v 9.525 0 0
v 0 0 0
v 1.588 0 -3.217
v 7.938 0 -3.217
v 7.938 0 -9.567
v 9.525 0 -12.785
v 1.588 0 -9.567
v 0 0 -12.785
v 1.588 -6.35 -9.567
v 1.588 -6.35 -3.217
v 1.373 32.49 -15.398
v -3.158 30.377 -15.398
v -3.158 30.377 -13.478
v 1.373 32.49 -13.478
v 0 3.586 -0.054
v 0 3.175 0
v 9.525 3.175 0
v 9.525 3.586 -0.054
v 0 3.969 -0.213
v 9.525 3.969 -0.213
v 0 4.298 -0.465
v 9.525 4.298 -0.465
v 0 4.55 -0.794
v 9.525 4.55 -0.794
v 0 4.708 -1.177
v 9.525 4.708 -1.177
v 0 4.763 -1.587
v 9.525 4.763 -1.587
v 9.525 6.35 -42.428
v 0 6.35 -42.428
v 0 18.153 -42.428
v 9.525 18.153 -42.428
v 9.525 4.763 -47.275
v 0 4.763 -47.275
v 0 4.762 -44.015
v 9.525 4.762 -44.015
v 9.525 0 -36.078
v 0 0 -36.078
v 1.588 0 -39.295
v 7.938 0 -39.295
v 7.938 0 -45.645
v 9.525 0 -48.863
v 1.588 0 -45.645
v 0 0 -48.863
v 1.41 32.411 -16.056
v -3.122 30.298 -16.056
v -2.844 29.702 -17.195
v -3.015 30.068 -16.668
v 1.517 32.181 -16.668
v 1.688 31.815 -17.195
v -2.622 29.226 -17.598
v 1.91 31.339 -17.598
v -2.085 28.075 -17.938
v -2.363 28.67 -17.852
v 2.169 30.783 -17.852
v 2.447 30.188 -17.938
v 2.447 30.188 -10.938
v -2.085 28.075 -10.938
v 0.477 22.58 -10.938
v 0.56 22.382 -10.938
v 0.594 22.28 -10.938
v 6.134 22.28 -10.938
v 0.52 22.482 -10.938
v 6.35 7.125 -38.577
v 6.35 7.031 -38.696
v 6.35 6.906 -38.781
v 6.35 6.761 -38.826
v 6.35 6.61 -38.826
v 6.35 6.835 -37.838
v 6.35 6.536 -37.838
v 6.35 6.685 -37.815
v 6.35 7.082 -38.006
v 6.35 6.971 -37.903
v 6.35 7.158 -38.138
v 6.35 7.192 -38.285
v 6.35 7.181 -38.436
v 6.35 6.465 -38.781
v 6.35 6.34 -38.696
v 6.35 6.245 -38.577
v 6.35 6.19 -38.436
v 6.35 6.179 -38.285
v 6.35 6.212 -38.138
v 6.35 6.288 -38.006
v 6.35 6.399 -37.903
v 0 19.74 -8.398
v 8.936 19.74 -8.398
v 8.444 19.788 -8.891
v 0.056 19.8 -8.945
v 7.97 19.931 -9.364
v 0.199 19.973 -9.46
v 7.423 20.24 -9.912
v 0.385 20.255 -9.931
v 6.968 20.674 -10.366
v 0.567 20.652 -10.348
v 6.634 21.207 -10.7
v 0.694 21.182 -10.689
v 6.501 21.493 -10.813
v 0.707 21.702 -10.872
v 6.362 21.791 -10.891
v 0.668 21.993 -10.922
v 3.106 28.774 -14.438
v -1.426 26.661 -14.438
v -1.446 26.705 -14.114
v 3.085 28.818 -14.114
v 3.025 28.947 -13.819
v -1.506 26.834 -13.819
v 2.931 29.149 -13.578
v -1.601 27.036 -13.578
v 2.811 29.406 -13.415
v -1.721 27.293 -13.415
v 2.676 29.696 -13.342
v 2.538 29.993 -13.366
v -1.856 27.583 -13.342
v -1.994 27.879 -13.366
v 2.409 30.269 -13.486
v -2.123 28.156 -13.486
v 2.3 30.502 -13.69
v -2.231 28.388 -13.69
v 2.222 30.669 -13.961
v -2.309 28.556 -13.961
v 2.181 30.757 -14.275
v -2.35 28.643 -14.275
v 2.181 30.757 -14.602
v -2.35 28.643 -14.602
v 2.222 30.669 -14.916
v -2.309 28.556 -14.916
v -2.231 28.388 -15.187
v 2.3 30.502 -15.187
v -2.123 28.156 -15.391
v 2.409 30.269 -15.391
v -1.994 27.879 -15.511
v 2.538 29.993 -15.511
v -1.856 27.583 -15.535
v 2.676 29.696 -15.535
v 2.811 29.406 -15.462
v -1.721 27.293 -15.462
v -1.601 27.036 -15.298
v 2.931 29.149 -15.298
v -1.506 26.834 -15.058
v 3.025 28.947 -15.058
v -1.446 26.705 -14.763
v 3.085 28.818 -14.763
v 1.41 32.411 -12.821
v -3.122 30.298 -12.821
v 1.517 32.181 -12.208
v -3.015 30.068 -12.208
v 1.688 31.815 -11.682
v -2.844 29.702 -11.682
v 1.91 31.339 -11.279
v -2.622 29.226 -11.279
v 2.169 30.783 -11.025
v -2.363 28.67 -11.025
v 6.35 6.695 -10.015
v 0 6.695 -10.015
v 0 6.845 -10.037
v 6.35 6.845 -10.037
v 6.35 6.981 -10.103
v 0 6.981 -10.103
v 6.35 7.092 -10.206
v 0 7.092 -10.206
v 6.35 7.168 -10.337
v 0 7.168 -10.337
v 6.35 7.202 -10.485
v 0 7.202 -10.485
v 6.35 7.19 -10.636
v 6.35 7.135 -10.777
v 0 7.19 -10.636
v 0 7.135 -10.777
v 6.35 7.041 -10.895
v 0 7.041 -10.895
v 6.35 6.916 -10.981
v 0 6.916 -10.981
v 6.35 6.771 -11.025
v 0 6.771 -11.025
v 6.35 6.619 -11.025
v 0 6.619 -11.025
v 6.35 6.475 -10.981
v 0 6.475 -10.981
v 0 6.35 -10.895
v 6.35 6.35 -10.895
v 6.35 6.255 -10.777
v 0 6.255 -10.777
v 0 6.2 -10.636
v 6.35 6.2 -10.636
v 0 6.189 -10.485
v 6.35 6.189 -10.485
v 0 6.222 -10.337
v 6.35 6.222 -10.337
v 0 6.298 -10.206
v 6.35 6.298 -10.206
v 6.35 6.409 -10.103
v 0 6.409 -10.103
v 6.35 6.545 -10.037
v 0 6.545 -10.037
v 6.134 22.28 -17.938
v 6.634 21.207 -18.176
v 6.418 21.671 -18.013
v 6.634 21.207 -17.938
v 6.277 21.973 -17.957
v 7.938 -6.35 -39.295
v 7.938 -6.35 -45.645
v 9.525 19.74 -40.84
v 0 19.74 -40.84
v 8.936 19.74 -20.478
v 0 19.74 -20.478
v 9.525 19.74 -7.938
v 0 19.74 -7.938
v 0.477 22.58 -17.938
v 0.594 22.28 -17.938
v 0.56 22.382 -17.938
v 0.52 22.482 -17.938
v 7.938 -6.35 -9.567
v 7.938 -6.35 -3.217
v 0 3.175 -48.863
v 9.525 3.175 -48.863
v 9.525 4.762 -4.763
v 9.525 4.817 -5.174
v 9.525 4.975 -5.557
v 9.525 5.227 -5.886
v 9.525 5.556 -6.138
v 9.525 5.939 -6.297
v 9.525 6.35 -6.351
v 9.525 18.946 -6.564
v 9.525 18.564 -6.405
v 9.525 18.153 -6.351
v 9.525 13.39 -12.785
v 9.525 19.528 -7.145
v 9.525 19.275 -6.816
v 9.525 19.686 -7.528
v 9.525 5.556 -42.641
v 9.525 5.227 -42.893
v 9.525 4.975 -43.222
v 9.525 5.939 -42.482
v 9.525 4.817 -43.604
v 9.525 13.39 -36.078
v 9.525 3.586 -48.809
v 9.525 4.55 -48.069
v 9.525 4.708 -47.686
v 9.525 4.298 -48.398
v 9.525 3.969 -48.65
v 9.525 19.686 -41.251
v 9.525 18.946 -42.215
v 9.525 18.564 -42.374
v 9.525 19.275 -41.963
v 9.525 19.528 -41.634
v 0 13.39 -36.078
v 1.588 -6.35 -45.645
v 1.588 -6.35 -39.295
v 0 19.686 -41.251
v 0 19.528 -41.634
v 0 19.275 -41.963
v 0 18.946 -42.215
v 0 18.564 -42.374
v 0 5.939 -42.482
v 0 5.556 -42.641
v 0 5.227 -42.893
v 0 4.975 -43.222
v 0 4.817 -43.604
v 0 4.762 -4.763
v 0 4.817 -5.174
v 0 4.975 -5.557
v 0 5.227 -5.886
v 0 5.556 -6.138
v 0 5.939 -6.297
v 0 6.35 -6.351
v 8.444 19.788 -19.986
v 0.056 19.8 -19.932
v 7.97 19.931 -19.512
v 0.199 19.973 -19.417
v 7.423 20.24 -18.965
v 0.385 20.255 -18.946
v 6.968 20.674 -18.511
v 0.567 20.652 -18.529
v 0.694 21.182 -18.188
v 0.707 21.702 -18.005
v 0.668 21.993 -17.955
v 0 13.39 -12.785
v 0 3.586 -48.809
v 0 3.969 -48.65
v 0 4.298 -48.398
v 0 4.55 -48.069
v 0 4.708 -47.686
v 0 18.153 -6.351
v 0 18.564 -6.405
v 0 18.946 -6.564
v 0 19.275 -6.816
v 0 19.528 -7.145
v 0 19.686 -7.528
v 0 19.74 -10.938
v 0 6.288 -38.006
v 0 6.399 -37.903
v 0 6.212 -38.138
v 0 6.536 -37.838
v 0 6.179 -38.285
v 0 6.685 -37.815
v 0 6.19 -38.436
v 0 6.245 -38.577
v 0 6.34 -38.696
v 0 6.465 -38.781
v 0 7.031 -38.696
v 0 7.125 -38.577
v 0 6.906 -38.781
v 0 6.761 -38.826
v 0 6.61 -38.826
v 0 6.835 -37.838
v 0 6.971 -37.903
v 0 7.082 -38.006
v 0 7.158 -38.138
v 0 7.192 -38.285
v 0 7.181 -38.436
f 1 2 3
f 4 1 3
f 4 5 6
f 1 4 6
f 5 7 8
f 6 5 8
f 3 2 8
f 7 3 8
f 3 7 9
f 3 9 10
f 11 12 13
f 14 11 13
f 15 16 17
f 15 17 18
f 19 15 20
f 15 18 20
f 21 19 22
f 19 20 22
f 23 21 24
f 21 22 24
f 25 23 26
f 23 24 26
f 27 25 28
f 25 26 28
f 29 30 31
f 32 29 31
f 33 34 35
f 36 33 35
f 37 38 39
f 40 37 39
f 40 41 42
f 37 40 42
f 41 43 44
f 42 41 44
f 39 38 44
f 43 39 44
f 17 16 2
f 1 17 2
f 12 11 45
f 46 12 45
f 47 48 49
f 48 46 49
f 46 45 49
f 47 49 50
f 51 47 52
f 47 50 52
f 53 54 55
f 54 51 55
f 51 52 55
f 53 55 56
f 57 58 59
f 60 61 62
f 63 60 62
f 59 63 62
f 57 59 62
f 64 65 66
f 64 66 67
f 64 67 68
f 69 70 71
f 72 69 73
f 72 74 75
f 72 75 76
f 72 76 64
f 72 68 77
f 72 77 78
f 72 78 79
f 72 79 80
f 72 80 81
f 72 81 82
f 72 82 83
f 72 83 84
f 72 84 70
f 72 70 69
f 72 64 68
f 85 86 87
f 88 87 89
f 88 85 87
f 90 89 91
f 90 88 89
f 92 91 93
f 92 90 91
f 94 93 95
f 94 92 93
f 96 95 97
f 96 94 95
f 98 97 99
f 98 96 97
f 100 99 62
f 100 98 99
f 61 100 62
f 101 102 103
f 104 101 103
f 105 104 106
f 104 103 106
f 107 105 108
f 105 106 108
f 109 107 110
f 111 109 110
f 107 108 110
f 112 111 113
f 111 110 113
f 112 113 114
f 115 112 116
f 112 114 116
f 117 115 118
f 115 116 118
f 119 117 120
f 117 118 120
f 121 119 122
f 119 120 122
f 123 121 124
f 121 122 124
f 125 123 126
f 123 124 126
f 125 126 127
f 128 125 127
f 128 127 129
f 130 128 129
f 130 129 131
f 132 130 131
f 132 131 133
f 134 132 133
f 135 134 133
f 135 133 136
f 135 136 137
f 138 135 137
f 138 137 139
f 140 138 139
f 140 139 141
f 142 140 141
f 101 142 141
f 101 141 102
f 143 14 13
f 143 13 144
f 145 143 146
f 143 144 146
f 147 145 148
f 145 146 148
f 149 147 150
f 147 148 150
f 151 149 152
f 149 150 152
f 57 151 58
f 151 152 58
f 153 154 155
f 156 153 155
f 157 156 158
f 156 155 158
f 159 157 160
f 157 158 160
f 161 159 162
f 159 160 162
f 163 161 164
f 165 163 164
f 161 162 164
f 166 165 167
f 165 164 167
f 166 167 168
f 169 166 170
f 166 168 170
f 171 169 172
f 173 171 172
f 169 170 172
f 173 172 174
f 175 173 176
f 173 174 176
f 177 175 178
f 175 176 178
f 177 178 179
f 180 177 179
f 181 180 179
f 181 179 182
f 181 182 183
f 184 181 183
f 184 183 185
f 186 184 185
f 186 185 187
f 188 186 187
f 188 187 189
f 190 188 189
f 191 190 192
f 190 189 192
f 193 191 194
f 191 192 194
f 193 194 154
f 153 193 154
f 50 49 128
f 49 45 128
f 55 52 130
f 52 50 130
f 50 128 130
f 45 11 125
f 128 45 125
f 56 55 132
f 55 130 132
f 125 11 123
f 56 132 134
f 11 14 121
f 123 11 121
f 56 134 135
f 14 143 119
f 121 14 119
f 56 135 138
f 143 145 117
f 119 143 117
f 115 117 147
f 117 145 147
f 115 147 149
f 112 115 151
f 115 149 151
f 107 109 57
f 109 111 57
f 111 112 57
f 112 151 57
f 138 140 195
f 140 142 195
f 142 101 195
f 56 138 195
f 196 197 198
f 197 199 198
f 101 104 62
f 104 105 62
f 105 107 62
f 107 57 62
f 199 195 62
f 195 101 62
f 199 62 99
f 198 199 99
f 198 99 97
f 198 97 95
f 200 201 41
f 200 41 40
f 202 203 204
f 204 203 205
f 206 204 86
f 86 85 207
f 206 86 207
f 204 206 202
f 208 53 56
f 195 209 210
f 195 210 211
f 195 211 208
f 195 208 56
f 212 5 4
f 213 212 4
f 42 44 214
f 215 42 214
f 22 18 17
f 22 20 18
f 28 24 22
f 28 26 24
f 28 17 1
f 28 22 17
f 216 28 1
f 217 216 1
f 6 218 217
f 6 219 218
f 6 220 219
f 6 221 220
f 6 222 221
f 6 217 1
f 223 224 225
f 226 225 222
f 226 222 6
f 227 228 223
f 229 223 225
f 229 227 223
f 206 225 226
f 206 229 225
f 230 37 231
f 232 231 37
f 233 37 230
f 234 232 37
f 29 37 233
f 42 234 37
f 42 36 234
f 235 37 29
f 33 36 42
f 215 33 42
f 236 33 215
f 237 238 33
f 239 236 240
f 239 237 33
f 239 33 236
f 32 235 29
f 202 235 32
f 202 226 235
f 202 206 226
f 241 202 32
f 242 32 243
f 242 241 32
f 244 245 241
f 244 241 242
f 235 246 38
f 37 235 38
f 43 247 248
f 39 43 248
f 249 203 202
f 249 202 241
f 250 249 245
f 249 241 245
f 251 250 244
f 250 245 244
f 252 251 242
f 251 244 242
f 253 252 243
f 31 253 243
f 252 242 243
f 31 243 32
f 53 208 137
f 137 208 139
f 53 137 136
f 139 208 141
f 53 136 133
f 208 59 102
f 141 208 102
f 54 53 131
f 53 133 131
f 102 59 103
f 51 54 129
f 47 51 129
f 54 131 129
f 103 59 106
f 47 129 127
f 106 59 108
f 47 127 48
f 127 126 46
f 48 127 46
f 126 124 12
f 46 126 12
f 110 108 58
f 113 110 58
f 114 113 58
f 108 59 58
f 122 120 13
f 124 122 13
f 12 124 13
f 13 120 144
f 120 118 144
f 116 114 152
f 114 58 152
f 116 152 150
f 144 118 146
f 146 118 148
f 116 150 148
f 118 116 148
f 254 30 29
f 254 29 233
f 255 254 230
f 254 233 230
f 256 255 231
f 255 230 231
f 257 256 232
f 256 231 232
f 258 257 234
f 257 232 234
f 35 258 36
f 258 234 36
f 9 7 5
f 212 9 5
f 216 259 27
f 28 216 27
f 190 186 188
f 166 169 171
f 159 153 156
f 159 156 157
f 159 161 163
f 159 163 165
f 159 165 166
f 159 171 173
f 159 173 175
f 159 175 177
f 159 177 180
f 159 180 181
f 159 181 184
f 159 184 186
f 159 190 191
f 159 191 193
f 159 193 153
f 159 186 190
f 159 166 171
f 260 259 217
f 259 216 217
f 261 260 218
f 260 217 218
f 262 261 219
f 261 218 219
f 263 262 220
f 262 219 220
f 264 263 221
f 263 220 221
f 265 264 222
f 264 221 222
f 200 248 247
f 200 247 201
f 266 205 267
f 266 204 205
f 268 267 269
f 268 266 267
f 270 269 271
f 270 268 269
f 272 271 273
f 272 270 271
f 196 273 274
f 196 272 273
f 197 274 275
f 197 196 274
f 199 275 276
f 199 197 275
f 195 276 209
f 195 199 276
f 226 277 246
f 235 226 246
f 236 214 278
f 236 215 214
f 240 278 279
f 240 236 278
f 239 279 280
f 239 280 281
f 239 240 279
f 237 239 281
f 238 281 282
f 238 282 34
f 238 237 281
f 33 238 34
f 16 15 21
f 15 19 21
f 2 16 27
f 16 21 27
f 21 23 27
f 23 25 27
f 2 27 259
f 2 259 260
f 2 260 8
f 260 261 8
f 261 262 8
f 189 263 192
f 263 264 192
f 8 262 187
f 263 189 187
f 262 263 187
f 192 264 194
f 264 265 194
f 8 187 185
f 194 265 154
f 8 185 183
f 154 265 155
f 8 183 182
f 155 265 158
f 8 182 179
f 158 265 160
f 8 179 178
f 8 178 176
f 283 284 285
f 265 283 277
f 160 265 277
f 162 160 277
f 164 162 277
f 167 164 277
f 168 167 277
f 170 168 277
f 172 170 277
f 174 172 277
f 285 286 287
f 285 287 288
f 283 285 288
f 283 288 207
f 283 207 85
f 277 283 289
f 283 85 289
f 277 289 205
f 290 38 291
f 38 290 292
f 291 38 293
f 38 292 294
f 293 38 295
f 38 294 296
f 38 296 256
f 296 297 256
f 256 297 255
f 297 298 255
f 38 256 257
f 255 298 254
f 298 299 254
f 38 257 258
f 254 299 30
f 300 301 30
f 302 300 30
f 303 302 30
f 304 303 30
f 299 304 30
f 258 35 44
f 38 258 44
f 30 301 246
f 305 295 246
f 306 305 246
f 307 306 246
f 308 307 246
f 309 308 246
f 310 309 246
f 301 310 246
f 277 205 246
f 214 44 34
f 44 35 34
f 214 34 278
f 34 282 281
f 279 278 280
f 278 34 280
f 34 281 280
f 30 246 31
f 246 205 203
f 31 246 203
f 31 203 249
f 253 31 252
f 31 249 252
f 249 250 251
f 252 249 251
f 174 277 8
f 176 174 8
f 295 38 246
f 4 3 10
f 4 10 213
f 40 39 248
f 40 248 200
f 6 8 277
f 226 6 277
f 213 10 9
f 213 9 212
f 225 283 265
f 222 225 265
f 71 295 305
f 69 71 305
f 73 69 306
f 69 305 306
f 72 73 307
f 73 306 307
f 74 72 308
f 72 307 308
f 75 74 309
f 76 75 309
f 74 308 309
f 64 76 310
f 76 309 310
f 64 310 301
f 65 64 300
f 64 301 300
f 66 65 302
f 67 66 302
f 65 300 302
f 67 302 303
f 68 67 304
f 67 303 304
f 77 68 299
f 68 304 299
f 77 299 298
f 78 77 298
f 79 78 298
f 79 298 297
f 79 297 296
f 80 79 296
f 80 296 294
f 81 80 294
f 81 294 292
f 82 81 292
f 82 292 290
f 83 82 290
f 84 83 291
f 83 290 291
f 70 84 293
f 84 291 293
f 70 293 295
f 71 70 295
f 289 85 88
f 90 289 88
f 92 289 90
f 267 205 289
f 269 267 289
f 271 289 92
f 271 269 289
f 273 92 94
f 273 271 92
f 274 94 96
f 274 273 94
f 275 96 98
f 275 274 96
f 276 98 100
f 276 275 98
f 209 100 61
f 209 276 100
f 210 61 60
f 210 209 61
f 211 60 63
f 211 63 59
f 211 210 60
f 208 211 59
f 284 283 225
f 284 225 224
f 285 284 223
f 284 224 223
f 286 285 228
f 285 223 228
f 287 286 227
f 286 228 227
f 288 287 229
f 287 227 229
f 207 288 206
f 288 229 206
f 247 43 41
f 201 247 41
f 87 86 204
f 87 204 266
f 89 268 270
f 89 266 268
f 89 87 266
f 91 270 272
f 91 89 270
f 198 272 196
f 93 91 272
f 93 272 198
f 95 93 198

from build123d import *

# Parameters (mm, degrees)
BOSS_EXTRUDE1_DEPTH     = 9.525
SKETCH3_R               = 0.508
CUT_EXTRUDE2_DEPTH      = 6.35
FILLET1_R               = 1.5875
ESQUISSE1_W             = 6.35
ESQUISSE1_H             = 6.35
BOSS_EXTRU_1_DEPTH      = 6.35
ESQUISSE2_W             = 7
ESQUISSE2_H             = 5
BOSS_EXTRU_2_DEPTH      = 15
ESQUISSE3_R             = 1.1
ENL_V_MAT_EXTRU_1_DEPTH = 58.756287679
CONG_1_R                = 2.54


with BuildPart() as part:
    # Sketch1 → Boss-Extrude1 (new body)
    with BuildSketch(Plane(origin=(0, 0, 0), x_dir=(0, 0, -1), z_dir=(1, 0, 0))):
        Polygon((0, 0), (12.7847852, 0), (12.7847852, 13.390245), (36.0778552, 13.390245), (36.0778552, 0), (48.8626404, 0), (48.8626404, 4.7625), (42.4278552, 4.7625), (42.4278552, 19.740245), (41.4309052, 19.740245), (6.3509652, 19.740245), (6.3509652, 4.7625), (0, 4.7625), align=None)
    extrude(amount=BOSS_EXTRUDE1_DEPTH)

    # Sketch3 → Cut-Extrude2 (cut)
    with BuildSketch(Plane.ZY):
        with Locations((-38.3232152, 6.68528)):
            Circle(SKETCH3_R)
        with Locations((-10.5229152, 6.6951225)):
            Circle(SKETCH3_R)
    extrude(amount=-CUT_EXTRUDE2_DEPTH, mode=Mode.SUBTRACT)

    # Fillet1
    fillet1_edges = [part.edges().sort_by_distance(p)[0] for p in [
        (4.7625, 4.7625, 0),
        (4.7625, 4.7625, -6.3509652),
        (4.7625, 19.740245, -6.3509652),
        (4.7625, 19.740245, -42.4278552),
        (4.7625, 4.7625, -42.4278552),
        (4.7625, 4.7625, -48.8626404),
    ]]
    fillet(fillet1_edges, radius=FILLET1_R)

    # Esquisse1 → Boss.-Extru.1 (add)
    with BuildSketch(Plane.XZ):
        with Locations((4.7625, -42.4702478)):
            Rectangle(ESQUISSE1_W, ESQUISSE1_H)
        with Locations((4.7625, -6.3923926)):
            Rectangle(ESQUISSE1_W, ESQUISSE1_H)
    extrude(amount=BOSS_EXTRU_1_DEPTH)

    # Esquisse2 → Boss.-Extru.2 (add)
    with BuildSketch(Plane(origin=(-5.859728485, 12.566228289, 0), x_dir=(0, 0, 1), z_dir=(0.4226182617389464, -0.9063077870374674, 0))):
        with Locations((-14.4384652, -12.4751697)):
            Rectangle(ESQUISSE2_W, ESQUISSE2_H)
    extrude(amount=-BOSS_EXTRU_2_DEPTH)

    # Esquisse3 → Enlèv. mat.-Extru.1 (cut, through all)
    with BuildSketch(Plane(origin=(9.040573976, 4.215688879, 0), x_dir=(0, 0, 1), z_dir=(-0.9063077870367755, -0.4226182617404302, 0))):
        with Locations(Location((-14.4384652, 25.865298818, 0), (0, 0, 270))):
            Circle(ESQUISSE3_R)
    extrude(amount=-ENL_V_MAT_EXTRU_1_DEPTH, mode=Mode.SUBTRACT)

    # Congé1
    # the kernel refuses this fillet: 2.54 mm, written as the material it adds along each edge
    with BuildSketch(Plane(origin=(7.318244162, 19.740245, -10.9384652), x_dir=(1, 0, 0), z_dir=(0, 0, -1))) as cong_1_piece_1:
        with BuildLine():
            CenterArc((CONG_1_R * 0.637070260809, -CONG_1_R), CONG_1_R, 90, 65)
            Line((-CONG_1_R * 0.269237526229, -CONG_1_R * 0.577381738261), (0, 0))
            Line((0, 0), (CONG_1_R * 0.637070260809, 0))
        make_face()
    extrude(amount=7)
    with BuildSketch(Plane(origin=(-4.548645433, 19.740245, -10.9384652), x_dir=(0, 0, 1), z_dir=(1, 0, 0))) as cong_1_piece_2_section:
        with BuildLine():
            CenterArc((CONG_1_R, -CONG_1_R), CONG_1_R, 90, 90)
            Line((0, -CONG_1_R), (0, 0))
            Line((0, 0), (CONG_1_R, 0))
        make_face()
    cong_1_piece_2 = extrude(amount=18.216889595, mode=Mode.PRIVATE)
    cong_1_piece_2 = split(cong_1_piece_2, bisect_by=Plane(origin=(5.198744163, 24.285527416, -10.9384652), z_dir=(-0.9063077870374674, -0.4226182617389464, 0)), keep=Keep.TOP, mode=Mode.PRIVATE)
    cong_1_piece_2 = split(cong_1_piece_2, bisect_by=Plane(origin=(0.667205228, 22.172436107, -10.9384652), z_dir=(0.9063077870374674, 0.4226182617389464, 0)), keep=Keep.TOP, mode=Mode.PRIVATE)
    add(cong_1_piece_2)
    with BuildSketch(Plane(origin=(1.801354567, 19.740245, -17.9384652), x_dir=(-1, 0, 0), z_dir=(0, 0, 1))) as cong_1_piece_3:
        with BuildLine():
            CenterArc((3.626366432, -1.766615888), CONG_1_R, 135.931485235, 69.068514765)
            Line((1.324344653, -2.840066273), (0, 0))
            Line((0, 0), (1.801354567, 0))
        make_face()
    extrude(amount=7)
    with BuildSketch(Plane(origin=(13.668244162, 19.740245, -17.9384652), x_dir=(0, 0, -1), z_dir=(-1, 0, 0))) as cong_1_piece_4_section:
        with BuildLine():
            CenterArc((CONG_1_R, -CONG_1_R), CONG_1_R, 90, 90)
            Line((0, -CONG_1_R), (0, 0))
            Line((0, 0), (CONG_1_R, 0))
        make_face()
    cong_1_piece_4 = extrude(amount=18.216889595, mode=Mode.PRIVATE)
    cong_1_piece_4 = split(cong_1_piece_4, bisect_by=Plane(origin=(8.452393501, 17.308053893, -17.9384652), z_dir=(-0.9063077870374674, -0.4226182617389464, 0)), keep=Keep.TOP, mode=Mode.PRIVATE)
    cong_1_piece_4 = split(cong_1_piece_4, bisect_by=Plane(origin=(3.920854566, 15.194962584, -17.9384652), z_dir=(0.9063077870374674, 0.4226182617389464, 0)), keep=Keep.TOP, mode=Mode.PRIVATE)
    add(cong_1_piece_4)
    with BuildSketch(Plane(origin=(7.318244162, 19.740245, -6.893069044), x_dir=(1, 0, 0), z_dir=(0, 0, -1))) as cong_1_piece_5a_section:
        with BuildLine():
            CenterArc((CONG_1_R * 0.637070260809, -CONG_1_R), CONG_1_R, 90, 65)
            Line((-CONG_1_R * 0.269237526229, -CONG_1_R * 0.577381738261), (0, 0))
            Line((0, 0), (CONG_1_R * 0.637070260809, 0))
        make_face()
    cong_1_piece_5a = extrude(amount=11.045396156, mode=Mode.PRIVATE)
    cong_1_piece_5a = split(cong_1_piece_5a, bisect_by=Plane(origin=(7.318244162, 19.740245, -10.9384652), z_dir=(0, 0, 1)), keep=Keep.TOP, mode=Mode.PRIVATE)
    with BuildSketch(Plane(origin=(-4.548645433, 19.740245, -10.9384652), x_dir=(0, 0, 1), z_dir=(1, 0, 0))) as cong_1_piece_5b_section:
        with BuildLine():
            CenterArc((CONG_1_R, -CONG_1_R), CONG_1_R, 90, 90)
            Line((0, -CONG_1_R), (0, 0))
            Line((0, 0), (CONG_1_R, 0))
        make_face()
    cong_1_piece_5b = extrude(amount=18.216889595, mode=Mode.PRIVATE)
    cong_1_piece_5b = split(cong_1_piece_5b, bisect_by=Plane(origin=(9.525, 19.740245, -10.9384652), z_dir=(-1, 0, 0)), keep=Keep.TOP, mode=Mode.PRIVATE)
    cong_1_piece_5b = split(cong_1_piece_5b, bisect_by=Plane(origin=(5.198744163, 24.285527416, -10.9384652), z_dir=(0.9063077870374674, 0.4226182617389464, 0)), keep=Keep.TOP, mode=Mode.PRIVATE)
    cong_1_piece_5 = cong_1_piece_5a & cong_1_piece_5b
    add(cong_1_piece_5)
    with BuildSketch(Plane(origin=(13.668244162, 19.740245, -17.9384652), x_dir=(0, 0, -1), z_dir=(-1, 0, 0))) as cong_1_piece_6a_section:
        with BuildLine():
            CenterArc((CONG_1_R, -CONG_1_R), CONG_1_R, 90, 90)
            Line((0, -CONG_1_R), (0, 0))
            Line((0, 0), (CONG_1_R, 0))
        make_face()
    cong_1_piece_6a = extrude(amount=18.216889595, mode=Mode.PRIVATE)
    cong_1_piece_6a = split(cong_1_piece_6a, bisect_by=Plane(origin=(9.525, 19.740245, -17.9384652), z_dir=(-1, 0, 0)), keep=Keep.TOP, mode=Mode.PRIVATE)
    cong_1_piece_6a = split(cong_1_piece_6a, bisect_by=Plane(origin=(8.452393501, 17.308053893, -17.9384652), z_dir=(0.9063077870374674, 0.4226182617389464, 0)), keep=Keep.TOP, mode=Mode.PRIVATE)
    with BuildSketch(Plane(origin=(7.318244162, 19.740245, -10.9384652), x_dir=(1, 0, 0), z_dir=(0, 0, -1))) as cong_1_piece_6b_section:
        with BuildLine():
            CenterArc((CONG_1_R * 0.637070260809, -CONG_1_R), CONG_1_R, 90, 65)
            Line((-CONG_1_R * 0.269237526229, -CONG_1_R * 0.577381738261), (0, 0))
            Line((0, 0), (CONG_1_R * 0.637070260809, 0))
        make_face()
    cong_1_piece_6b = extrude(amount=11.045396156, mode=Mode.PRIVATE)
    cong_1_piece_6b = split(cong_1_piece_6b, bisect_by=Plane(origin=(7.318244162, 19.740245, -17.9384652), z_dir=(0, 0, -1)), keep=Keep.TOP, mode=Mode.PRIVATE)
    cong_1_piece_6 = cong_1_piece_6a & cong_1_piece_6b
    add(cong_1_piece_6)
    with BuildSketch(Plane(origin=(-4.548645433, 19.740245, -10.9384652), x_dir=(0, 0, 1), z_dir=(1, 0, 0))) as cong_1_piece_7a_section:
        with BuildLine():
            CenterArc((CONG_1_R, -CONG_1_R), CONG_1_R, 90, 90)
            Line((0, -CONG_1_R), (0, 0))
            Line((0, 0), (CONG_1_R, 0))
        make_face()
    cong_1_piece_7a = extrude(amount=18.216889595, mode=Mode.PRIVATE)
    cong_1_piece_7a = split(cong_1_piece_7a, bisect_by=Plane(origin=(0, 19.740245, -10.9384652), z_dir=(1, 0, 0)), keep=Keep.TOP, mode=Mode.PRIVATE)
    cong_1_piece_7a = split(cong_1_piece_7a, bisect_by=Plane(origin=(0.667205228, 22.172436107, -10.9384652), z_dir=(-0.9063077870374674, -0.4226182617389464, 0)), keep=Keep.TOP, mode=Mode.PRIVATE)
    with BuildSketch(Plane(origin=(1.801354567, 19.740245, -17.9384652), x_dir=(-1, 0, 0), z_dir=(0, 0, 1))) as cong_1_piece_7b_section:
        with BuildLine():
            CenterArc((3.626366432, -1.766615888), CONG_1_R, 135.931485235, 69.068514765)
            Line((1.324344653, -2.840066273), (0, 0))
            Line((0, 0), (1.801354567, 0))
        make_face()
    cong_1_piece_7b = extrude(amount=14.834166034, mode=Mode.PRIVATE)
    cong_1_piece_7b = split(cong_1_piece_7b, bisect_by=Plane(origin=(1.801354567, 19.740245, -10.9384652), z_dir=(0, 0, 1)), keep=Keep.TOP, mode=Mode.PRIVATE)
    cong_1_piece_7 = cong_1_piece_7a & cong_1_piece_7b
    add(cong_1_piece_7)
    with BuildSketch(Plane(origin=(13.668244162, 19.740245, -17.9384652), x_dir=(0, 0, -1), z_dir=(-1, 0, 0))) as cong_1_piece_8a_section:
        with BuildLine():
            CenterArc((CONG_1_R, -CONG_1_R), CONG_1_R, 90, 90)
            Line((0, -CONG_1_R), (0, 0))
            Line((0, 0), (CONG_1_R, 0))
        make_face()
    cong_1_piece_8a = extrude(amount=18.216889595, mode=Mode.PRIVATE)
    cong_1_piece_8a = split(cong_1_piece_8a, bisect_by=Plane(origin=(0, 19.740245, -17.9384652), z_dir=(1, 0, 0)), keep=Keep.TOP, mode=Mode.PRIVATE)
    cong_1_piece_8a = split(cong_1_piece_8a, bisect_by=Plane(origin=(3.920854566, 15.194962584, -17.9384652), z_dir=(-0.9063077870374674, -0.4226182617389464, 0)), keep=Keep.TOP, mode=Mode.PRIVATE)
    with BuildSketch(Plane(origin=(1.801354567, 19.740245, -25.772631234), x_dir=(-1, 0, 0), z_dir=(0, 0, 1))) as cong_1_piece_8b_section:
        with BuildLine():
            CenterArc((3.626366432, -1.766615888), CONG_1_R, 135.931485235, 69.068514765)
            Line((1.324344653, -2.840066273), (0, 0))
            Line((0, 0), (1.801354567, 0))
        make_face()
    cong_1_piece_8b = extrude(amount=14.834166034, mode=Mode.PRIVATE)
    cong_1_piece_8b = split(cong_1_piece_8b, bisect_by=Plane(origin=(1.801354567, 19.740245, -17.9384652), z_dir=(0, 0, -1)), keep=Keep.TOP, mode=Mode.PRIVATE)
    cong_1_piece_8 = cong_1_piece_8a & cong_1_piece_8b
    add(cong_1_piece_8)
    # the kernel refuses this fillet: 2.54 mm, written as the material it takes off along each edge
    with BuildSketch(Plane(origin=(7.128164948, 35.173251244, -17.9384652), x_dir=(0, 0, 1), z_dir=(-0.9063077870374675, -0.42261826173894645, 0)), Plane(origin=(-8.913482883, 27.692908011, -10.9384652), x_dir=(0, 0, -1), z_dir=(0.9063077870374675, 0.42261826173894645, 0))) as cong_1_2_piece_1:
        with BuildLine():
            CenterArc((CONG_1_R, -CONG_1_R), CONG_1_R, 90, 90)
            Line((0, -CONG_1_R), (0, 0))
            Line((0, 0), (CONG_1_R, 0))
        make_face()
    extrude(amount=17.7, mode=Mode.SUBTRACT)


solid = part.part
